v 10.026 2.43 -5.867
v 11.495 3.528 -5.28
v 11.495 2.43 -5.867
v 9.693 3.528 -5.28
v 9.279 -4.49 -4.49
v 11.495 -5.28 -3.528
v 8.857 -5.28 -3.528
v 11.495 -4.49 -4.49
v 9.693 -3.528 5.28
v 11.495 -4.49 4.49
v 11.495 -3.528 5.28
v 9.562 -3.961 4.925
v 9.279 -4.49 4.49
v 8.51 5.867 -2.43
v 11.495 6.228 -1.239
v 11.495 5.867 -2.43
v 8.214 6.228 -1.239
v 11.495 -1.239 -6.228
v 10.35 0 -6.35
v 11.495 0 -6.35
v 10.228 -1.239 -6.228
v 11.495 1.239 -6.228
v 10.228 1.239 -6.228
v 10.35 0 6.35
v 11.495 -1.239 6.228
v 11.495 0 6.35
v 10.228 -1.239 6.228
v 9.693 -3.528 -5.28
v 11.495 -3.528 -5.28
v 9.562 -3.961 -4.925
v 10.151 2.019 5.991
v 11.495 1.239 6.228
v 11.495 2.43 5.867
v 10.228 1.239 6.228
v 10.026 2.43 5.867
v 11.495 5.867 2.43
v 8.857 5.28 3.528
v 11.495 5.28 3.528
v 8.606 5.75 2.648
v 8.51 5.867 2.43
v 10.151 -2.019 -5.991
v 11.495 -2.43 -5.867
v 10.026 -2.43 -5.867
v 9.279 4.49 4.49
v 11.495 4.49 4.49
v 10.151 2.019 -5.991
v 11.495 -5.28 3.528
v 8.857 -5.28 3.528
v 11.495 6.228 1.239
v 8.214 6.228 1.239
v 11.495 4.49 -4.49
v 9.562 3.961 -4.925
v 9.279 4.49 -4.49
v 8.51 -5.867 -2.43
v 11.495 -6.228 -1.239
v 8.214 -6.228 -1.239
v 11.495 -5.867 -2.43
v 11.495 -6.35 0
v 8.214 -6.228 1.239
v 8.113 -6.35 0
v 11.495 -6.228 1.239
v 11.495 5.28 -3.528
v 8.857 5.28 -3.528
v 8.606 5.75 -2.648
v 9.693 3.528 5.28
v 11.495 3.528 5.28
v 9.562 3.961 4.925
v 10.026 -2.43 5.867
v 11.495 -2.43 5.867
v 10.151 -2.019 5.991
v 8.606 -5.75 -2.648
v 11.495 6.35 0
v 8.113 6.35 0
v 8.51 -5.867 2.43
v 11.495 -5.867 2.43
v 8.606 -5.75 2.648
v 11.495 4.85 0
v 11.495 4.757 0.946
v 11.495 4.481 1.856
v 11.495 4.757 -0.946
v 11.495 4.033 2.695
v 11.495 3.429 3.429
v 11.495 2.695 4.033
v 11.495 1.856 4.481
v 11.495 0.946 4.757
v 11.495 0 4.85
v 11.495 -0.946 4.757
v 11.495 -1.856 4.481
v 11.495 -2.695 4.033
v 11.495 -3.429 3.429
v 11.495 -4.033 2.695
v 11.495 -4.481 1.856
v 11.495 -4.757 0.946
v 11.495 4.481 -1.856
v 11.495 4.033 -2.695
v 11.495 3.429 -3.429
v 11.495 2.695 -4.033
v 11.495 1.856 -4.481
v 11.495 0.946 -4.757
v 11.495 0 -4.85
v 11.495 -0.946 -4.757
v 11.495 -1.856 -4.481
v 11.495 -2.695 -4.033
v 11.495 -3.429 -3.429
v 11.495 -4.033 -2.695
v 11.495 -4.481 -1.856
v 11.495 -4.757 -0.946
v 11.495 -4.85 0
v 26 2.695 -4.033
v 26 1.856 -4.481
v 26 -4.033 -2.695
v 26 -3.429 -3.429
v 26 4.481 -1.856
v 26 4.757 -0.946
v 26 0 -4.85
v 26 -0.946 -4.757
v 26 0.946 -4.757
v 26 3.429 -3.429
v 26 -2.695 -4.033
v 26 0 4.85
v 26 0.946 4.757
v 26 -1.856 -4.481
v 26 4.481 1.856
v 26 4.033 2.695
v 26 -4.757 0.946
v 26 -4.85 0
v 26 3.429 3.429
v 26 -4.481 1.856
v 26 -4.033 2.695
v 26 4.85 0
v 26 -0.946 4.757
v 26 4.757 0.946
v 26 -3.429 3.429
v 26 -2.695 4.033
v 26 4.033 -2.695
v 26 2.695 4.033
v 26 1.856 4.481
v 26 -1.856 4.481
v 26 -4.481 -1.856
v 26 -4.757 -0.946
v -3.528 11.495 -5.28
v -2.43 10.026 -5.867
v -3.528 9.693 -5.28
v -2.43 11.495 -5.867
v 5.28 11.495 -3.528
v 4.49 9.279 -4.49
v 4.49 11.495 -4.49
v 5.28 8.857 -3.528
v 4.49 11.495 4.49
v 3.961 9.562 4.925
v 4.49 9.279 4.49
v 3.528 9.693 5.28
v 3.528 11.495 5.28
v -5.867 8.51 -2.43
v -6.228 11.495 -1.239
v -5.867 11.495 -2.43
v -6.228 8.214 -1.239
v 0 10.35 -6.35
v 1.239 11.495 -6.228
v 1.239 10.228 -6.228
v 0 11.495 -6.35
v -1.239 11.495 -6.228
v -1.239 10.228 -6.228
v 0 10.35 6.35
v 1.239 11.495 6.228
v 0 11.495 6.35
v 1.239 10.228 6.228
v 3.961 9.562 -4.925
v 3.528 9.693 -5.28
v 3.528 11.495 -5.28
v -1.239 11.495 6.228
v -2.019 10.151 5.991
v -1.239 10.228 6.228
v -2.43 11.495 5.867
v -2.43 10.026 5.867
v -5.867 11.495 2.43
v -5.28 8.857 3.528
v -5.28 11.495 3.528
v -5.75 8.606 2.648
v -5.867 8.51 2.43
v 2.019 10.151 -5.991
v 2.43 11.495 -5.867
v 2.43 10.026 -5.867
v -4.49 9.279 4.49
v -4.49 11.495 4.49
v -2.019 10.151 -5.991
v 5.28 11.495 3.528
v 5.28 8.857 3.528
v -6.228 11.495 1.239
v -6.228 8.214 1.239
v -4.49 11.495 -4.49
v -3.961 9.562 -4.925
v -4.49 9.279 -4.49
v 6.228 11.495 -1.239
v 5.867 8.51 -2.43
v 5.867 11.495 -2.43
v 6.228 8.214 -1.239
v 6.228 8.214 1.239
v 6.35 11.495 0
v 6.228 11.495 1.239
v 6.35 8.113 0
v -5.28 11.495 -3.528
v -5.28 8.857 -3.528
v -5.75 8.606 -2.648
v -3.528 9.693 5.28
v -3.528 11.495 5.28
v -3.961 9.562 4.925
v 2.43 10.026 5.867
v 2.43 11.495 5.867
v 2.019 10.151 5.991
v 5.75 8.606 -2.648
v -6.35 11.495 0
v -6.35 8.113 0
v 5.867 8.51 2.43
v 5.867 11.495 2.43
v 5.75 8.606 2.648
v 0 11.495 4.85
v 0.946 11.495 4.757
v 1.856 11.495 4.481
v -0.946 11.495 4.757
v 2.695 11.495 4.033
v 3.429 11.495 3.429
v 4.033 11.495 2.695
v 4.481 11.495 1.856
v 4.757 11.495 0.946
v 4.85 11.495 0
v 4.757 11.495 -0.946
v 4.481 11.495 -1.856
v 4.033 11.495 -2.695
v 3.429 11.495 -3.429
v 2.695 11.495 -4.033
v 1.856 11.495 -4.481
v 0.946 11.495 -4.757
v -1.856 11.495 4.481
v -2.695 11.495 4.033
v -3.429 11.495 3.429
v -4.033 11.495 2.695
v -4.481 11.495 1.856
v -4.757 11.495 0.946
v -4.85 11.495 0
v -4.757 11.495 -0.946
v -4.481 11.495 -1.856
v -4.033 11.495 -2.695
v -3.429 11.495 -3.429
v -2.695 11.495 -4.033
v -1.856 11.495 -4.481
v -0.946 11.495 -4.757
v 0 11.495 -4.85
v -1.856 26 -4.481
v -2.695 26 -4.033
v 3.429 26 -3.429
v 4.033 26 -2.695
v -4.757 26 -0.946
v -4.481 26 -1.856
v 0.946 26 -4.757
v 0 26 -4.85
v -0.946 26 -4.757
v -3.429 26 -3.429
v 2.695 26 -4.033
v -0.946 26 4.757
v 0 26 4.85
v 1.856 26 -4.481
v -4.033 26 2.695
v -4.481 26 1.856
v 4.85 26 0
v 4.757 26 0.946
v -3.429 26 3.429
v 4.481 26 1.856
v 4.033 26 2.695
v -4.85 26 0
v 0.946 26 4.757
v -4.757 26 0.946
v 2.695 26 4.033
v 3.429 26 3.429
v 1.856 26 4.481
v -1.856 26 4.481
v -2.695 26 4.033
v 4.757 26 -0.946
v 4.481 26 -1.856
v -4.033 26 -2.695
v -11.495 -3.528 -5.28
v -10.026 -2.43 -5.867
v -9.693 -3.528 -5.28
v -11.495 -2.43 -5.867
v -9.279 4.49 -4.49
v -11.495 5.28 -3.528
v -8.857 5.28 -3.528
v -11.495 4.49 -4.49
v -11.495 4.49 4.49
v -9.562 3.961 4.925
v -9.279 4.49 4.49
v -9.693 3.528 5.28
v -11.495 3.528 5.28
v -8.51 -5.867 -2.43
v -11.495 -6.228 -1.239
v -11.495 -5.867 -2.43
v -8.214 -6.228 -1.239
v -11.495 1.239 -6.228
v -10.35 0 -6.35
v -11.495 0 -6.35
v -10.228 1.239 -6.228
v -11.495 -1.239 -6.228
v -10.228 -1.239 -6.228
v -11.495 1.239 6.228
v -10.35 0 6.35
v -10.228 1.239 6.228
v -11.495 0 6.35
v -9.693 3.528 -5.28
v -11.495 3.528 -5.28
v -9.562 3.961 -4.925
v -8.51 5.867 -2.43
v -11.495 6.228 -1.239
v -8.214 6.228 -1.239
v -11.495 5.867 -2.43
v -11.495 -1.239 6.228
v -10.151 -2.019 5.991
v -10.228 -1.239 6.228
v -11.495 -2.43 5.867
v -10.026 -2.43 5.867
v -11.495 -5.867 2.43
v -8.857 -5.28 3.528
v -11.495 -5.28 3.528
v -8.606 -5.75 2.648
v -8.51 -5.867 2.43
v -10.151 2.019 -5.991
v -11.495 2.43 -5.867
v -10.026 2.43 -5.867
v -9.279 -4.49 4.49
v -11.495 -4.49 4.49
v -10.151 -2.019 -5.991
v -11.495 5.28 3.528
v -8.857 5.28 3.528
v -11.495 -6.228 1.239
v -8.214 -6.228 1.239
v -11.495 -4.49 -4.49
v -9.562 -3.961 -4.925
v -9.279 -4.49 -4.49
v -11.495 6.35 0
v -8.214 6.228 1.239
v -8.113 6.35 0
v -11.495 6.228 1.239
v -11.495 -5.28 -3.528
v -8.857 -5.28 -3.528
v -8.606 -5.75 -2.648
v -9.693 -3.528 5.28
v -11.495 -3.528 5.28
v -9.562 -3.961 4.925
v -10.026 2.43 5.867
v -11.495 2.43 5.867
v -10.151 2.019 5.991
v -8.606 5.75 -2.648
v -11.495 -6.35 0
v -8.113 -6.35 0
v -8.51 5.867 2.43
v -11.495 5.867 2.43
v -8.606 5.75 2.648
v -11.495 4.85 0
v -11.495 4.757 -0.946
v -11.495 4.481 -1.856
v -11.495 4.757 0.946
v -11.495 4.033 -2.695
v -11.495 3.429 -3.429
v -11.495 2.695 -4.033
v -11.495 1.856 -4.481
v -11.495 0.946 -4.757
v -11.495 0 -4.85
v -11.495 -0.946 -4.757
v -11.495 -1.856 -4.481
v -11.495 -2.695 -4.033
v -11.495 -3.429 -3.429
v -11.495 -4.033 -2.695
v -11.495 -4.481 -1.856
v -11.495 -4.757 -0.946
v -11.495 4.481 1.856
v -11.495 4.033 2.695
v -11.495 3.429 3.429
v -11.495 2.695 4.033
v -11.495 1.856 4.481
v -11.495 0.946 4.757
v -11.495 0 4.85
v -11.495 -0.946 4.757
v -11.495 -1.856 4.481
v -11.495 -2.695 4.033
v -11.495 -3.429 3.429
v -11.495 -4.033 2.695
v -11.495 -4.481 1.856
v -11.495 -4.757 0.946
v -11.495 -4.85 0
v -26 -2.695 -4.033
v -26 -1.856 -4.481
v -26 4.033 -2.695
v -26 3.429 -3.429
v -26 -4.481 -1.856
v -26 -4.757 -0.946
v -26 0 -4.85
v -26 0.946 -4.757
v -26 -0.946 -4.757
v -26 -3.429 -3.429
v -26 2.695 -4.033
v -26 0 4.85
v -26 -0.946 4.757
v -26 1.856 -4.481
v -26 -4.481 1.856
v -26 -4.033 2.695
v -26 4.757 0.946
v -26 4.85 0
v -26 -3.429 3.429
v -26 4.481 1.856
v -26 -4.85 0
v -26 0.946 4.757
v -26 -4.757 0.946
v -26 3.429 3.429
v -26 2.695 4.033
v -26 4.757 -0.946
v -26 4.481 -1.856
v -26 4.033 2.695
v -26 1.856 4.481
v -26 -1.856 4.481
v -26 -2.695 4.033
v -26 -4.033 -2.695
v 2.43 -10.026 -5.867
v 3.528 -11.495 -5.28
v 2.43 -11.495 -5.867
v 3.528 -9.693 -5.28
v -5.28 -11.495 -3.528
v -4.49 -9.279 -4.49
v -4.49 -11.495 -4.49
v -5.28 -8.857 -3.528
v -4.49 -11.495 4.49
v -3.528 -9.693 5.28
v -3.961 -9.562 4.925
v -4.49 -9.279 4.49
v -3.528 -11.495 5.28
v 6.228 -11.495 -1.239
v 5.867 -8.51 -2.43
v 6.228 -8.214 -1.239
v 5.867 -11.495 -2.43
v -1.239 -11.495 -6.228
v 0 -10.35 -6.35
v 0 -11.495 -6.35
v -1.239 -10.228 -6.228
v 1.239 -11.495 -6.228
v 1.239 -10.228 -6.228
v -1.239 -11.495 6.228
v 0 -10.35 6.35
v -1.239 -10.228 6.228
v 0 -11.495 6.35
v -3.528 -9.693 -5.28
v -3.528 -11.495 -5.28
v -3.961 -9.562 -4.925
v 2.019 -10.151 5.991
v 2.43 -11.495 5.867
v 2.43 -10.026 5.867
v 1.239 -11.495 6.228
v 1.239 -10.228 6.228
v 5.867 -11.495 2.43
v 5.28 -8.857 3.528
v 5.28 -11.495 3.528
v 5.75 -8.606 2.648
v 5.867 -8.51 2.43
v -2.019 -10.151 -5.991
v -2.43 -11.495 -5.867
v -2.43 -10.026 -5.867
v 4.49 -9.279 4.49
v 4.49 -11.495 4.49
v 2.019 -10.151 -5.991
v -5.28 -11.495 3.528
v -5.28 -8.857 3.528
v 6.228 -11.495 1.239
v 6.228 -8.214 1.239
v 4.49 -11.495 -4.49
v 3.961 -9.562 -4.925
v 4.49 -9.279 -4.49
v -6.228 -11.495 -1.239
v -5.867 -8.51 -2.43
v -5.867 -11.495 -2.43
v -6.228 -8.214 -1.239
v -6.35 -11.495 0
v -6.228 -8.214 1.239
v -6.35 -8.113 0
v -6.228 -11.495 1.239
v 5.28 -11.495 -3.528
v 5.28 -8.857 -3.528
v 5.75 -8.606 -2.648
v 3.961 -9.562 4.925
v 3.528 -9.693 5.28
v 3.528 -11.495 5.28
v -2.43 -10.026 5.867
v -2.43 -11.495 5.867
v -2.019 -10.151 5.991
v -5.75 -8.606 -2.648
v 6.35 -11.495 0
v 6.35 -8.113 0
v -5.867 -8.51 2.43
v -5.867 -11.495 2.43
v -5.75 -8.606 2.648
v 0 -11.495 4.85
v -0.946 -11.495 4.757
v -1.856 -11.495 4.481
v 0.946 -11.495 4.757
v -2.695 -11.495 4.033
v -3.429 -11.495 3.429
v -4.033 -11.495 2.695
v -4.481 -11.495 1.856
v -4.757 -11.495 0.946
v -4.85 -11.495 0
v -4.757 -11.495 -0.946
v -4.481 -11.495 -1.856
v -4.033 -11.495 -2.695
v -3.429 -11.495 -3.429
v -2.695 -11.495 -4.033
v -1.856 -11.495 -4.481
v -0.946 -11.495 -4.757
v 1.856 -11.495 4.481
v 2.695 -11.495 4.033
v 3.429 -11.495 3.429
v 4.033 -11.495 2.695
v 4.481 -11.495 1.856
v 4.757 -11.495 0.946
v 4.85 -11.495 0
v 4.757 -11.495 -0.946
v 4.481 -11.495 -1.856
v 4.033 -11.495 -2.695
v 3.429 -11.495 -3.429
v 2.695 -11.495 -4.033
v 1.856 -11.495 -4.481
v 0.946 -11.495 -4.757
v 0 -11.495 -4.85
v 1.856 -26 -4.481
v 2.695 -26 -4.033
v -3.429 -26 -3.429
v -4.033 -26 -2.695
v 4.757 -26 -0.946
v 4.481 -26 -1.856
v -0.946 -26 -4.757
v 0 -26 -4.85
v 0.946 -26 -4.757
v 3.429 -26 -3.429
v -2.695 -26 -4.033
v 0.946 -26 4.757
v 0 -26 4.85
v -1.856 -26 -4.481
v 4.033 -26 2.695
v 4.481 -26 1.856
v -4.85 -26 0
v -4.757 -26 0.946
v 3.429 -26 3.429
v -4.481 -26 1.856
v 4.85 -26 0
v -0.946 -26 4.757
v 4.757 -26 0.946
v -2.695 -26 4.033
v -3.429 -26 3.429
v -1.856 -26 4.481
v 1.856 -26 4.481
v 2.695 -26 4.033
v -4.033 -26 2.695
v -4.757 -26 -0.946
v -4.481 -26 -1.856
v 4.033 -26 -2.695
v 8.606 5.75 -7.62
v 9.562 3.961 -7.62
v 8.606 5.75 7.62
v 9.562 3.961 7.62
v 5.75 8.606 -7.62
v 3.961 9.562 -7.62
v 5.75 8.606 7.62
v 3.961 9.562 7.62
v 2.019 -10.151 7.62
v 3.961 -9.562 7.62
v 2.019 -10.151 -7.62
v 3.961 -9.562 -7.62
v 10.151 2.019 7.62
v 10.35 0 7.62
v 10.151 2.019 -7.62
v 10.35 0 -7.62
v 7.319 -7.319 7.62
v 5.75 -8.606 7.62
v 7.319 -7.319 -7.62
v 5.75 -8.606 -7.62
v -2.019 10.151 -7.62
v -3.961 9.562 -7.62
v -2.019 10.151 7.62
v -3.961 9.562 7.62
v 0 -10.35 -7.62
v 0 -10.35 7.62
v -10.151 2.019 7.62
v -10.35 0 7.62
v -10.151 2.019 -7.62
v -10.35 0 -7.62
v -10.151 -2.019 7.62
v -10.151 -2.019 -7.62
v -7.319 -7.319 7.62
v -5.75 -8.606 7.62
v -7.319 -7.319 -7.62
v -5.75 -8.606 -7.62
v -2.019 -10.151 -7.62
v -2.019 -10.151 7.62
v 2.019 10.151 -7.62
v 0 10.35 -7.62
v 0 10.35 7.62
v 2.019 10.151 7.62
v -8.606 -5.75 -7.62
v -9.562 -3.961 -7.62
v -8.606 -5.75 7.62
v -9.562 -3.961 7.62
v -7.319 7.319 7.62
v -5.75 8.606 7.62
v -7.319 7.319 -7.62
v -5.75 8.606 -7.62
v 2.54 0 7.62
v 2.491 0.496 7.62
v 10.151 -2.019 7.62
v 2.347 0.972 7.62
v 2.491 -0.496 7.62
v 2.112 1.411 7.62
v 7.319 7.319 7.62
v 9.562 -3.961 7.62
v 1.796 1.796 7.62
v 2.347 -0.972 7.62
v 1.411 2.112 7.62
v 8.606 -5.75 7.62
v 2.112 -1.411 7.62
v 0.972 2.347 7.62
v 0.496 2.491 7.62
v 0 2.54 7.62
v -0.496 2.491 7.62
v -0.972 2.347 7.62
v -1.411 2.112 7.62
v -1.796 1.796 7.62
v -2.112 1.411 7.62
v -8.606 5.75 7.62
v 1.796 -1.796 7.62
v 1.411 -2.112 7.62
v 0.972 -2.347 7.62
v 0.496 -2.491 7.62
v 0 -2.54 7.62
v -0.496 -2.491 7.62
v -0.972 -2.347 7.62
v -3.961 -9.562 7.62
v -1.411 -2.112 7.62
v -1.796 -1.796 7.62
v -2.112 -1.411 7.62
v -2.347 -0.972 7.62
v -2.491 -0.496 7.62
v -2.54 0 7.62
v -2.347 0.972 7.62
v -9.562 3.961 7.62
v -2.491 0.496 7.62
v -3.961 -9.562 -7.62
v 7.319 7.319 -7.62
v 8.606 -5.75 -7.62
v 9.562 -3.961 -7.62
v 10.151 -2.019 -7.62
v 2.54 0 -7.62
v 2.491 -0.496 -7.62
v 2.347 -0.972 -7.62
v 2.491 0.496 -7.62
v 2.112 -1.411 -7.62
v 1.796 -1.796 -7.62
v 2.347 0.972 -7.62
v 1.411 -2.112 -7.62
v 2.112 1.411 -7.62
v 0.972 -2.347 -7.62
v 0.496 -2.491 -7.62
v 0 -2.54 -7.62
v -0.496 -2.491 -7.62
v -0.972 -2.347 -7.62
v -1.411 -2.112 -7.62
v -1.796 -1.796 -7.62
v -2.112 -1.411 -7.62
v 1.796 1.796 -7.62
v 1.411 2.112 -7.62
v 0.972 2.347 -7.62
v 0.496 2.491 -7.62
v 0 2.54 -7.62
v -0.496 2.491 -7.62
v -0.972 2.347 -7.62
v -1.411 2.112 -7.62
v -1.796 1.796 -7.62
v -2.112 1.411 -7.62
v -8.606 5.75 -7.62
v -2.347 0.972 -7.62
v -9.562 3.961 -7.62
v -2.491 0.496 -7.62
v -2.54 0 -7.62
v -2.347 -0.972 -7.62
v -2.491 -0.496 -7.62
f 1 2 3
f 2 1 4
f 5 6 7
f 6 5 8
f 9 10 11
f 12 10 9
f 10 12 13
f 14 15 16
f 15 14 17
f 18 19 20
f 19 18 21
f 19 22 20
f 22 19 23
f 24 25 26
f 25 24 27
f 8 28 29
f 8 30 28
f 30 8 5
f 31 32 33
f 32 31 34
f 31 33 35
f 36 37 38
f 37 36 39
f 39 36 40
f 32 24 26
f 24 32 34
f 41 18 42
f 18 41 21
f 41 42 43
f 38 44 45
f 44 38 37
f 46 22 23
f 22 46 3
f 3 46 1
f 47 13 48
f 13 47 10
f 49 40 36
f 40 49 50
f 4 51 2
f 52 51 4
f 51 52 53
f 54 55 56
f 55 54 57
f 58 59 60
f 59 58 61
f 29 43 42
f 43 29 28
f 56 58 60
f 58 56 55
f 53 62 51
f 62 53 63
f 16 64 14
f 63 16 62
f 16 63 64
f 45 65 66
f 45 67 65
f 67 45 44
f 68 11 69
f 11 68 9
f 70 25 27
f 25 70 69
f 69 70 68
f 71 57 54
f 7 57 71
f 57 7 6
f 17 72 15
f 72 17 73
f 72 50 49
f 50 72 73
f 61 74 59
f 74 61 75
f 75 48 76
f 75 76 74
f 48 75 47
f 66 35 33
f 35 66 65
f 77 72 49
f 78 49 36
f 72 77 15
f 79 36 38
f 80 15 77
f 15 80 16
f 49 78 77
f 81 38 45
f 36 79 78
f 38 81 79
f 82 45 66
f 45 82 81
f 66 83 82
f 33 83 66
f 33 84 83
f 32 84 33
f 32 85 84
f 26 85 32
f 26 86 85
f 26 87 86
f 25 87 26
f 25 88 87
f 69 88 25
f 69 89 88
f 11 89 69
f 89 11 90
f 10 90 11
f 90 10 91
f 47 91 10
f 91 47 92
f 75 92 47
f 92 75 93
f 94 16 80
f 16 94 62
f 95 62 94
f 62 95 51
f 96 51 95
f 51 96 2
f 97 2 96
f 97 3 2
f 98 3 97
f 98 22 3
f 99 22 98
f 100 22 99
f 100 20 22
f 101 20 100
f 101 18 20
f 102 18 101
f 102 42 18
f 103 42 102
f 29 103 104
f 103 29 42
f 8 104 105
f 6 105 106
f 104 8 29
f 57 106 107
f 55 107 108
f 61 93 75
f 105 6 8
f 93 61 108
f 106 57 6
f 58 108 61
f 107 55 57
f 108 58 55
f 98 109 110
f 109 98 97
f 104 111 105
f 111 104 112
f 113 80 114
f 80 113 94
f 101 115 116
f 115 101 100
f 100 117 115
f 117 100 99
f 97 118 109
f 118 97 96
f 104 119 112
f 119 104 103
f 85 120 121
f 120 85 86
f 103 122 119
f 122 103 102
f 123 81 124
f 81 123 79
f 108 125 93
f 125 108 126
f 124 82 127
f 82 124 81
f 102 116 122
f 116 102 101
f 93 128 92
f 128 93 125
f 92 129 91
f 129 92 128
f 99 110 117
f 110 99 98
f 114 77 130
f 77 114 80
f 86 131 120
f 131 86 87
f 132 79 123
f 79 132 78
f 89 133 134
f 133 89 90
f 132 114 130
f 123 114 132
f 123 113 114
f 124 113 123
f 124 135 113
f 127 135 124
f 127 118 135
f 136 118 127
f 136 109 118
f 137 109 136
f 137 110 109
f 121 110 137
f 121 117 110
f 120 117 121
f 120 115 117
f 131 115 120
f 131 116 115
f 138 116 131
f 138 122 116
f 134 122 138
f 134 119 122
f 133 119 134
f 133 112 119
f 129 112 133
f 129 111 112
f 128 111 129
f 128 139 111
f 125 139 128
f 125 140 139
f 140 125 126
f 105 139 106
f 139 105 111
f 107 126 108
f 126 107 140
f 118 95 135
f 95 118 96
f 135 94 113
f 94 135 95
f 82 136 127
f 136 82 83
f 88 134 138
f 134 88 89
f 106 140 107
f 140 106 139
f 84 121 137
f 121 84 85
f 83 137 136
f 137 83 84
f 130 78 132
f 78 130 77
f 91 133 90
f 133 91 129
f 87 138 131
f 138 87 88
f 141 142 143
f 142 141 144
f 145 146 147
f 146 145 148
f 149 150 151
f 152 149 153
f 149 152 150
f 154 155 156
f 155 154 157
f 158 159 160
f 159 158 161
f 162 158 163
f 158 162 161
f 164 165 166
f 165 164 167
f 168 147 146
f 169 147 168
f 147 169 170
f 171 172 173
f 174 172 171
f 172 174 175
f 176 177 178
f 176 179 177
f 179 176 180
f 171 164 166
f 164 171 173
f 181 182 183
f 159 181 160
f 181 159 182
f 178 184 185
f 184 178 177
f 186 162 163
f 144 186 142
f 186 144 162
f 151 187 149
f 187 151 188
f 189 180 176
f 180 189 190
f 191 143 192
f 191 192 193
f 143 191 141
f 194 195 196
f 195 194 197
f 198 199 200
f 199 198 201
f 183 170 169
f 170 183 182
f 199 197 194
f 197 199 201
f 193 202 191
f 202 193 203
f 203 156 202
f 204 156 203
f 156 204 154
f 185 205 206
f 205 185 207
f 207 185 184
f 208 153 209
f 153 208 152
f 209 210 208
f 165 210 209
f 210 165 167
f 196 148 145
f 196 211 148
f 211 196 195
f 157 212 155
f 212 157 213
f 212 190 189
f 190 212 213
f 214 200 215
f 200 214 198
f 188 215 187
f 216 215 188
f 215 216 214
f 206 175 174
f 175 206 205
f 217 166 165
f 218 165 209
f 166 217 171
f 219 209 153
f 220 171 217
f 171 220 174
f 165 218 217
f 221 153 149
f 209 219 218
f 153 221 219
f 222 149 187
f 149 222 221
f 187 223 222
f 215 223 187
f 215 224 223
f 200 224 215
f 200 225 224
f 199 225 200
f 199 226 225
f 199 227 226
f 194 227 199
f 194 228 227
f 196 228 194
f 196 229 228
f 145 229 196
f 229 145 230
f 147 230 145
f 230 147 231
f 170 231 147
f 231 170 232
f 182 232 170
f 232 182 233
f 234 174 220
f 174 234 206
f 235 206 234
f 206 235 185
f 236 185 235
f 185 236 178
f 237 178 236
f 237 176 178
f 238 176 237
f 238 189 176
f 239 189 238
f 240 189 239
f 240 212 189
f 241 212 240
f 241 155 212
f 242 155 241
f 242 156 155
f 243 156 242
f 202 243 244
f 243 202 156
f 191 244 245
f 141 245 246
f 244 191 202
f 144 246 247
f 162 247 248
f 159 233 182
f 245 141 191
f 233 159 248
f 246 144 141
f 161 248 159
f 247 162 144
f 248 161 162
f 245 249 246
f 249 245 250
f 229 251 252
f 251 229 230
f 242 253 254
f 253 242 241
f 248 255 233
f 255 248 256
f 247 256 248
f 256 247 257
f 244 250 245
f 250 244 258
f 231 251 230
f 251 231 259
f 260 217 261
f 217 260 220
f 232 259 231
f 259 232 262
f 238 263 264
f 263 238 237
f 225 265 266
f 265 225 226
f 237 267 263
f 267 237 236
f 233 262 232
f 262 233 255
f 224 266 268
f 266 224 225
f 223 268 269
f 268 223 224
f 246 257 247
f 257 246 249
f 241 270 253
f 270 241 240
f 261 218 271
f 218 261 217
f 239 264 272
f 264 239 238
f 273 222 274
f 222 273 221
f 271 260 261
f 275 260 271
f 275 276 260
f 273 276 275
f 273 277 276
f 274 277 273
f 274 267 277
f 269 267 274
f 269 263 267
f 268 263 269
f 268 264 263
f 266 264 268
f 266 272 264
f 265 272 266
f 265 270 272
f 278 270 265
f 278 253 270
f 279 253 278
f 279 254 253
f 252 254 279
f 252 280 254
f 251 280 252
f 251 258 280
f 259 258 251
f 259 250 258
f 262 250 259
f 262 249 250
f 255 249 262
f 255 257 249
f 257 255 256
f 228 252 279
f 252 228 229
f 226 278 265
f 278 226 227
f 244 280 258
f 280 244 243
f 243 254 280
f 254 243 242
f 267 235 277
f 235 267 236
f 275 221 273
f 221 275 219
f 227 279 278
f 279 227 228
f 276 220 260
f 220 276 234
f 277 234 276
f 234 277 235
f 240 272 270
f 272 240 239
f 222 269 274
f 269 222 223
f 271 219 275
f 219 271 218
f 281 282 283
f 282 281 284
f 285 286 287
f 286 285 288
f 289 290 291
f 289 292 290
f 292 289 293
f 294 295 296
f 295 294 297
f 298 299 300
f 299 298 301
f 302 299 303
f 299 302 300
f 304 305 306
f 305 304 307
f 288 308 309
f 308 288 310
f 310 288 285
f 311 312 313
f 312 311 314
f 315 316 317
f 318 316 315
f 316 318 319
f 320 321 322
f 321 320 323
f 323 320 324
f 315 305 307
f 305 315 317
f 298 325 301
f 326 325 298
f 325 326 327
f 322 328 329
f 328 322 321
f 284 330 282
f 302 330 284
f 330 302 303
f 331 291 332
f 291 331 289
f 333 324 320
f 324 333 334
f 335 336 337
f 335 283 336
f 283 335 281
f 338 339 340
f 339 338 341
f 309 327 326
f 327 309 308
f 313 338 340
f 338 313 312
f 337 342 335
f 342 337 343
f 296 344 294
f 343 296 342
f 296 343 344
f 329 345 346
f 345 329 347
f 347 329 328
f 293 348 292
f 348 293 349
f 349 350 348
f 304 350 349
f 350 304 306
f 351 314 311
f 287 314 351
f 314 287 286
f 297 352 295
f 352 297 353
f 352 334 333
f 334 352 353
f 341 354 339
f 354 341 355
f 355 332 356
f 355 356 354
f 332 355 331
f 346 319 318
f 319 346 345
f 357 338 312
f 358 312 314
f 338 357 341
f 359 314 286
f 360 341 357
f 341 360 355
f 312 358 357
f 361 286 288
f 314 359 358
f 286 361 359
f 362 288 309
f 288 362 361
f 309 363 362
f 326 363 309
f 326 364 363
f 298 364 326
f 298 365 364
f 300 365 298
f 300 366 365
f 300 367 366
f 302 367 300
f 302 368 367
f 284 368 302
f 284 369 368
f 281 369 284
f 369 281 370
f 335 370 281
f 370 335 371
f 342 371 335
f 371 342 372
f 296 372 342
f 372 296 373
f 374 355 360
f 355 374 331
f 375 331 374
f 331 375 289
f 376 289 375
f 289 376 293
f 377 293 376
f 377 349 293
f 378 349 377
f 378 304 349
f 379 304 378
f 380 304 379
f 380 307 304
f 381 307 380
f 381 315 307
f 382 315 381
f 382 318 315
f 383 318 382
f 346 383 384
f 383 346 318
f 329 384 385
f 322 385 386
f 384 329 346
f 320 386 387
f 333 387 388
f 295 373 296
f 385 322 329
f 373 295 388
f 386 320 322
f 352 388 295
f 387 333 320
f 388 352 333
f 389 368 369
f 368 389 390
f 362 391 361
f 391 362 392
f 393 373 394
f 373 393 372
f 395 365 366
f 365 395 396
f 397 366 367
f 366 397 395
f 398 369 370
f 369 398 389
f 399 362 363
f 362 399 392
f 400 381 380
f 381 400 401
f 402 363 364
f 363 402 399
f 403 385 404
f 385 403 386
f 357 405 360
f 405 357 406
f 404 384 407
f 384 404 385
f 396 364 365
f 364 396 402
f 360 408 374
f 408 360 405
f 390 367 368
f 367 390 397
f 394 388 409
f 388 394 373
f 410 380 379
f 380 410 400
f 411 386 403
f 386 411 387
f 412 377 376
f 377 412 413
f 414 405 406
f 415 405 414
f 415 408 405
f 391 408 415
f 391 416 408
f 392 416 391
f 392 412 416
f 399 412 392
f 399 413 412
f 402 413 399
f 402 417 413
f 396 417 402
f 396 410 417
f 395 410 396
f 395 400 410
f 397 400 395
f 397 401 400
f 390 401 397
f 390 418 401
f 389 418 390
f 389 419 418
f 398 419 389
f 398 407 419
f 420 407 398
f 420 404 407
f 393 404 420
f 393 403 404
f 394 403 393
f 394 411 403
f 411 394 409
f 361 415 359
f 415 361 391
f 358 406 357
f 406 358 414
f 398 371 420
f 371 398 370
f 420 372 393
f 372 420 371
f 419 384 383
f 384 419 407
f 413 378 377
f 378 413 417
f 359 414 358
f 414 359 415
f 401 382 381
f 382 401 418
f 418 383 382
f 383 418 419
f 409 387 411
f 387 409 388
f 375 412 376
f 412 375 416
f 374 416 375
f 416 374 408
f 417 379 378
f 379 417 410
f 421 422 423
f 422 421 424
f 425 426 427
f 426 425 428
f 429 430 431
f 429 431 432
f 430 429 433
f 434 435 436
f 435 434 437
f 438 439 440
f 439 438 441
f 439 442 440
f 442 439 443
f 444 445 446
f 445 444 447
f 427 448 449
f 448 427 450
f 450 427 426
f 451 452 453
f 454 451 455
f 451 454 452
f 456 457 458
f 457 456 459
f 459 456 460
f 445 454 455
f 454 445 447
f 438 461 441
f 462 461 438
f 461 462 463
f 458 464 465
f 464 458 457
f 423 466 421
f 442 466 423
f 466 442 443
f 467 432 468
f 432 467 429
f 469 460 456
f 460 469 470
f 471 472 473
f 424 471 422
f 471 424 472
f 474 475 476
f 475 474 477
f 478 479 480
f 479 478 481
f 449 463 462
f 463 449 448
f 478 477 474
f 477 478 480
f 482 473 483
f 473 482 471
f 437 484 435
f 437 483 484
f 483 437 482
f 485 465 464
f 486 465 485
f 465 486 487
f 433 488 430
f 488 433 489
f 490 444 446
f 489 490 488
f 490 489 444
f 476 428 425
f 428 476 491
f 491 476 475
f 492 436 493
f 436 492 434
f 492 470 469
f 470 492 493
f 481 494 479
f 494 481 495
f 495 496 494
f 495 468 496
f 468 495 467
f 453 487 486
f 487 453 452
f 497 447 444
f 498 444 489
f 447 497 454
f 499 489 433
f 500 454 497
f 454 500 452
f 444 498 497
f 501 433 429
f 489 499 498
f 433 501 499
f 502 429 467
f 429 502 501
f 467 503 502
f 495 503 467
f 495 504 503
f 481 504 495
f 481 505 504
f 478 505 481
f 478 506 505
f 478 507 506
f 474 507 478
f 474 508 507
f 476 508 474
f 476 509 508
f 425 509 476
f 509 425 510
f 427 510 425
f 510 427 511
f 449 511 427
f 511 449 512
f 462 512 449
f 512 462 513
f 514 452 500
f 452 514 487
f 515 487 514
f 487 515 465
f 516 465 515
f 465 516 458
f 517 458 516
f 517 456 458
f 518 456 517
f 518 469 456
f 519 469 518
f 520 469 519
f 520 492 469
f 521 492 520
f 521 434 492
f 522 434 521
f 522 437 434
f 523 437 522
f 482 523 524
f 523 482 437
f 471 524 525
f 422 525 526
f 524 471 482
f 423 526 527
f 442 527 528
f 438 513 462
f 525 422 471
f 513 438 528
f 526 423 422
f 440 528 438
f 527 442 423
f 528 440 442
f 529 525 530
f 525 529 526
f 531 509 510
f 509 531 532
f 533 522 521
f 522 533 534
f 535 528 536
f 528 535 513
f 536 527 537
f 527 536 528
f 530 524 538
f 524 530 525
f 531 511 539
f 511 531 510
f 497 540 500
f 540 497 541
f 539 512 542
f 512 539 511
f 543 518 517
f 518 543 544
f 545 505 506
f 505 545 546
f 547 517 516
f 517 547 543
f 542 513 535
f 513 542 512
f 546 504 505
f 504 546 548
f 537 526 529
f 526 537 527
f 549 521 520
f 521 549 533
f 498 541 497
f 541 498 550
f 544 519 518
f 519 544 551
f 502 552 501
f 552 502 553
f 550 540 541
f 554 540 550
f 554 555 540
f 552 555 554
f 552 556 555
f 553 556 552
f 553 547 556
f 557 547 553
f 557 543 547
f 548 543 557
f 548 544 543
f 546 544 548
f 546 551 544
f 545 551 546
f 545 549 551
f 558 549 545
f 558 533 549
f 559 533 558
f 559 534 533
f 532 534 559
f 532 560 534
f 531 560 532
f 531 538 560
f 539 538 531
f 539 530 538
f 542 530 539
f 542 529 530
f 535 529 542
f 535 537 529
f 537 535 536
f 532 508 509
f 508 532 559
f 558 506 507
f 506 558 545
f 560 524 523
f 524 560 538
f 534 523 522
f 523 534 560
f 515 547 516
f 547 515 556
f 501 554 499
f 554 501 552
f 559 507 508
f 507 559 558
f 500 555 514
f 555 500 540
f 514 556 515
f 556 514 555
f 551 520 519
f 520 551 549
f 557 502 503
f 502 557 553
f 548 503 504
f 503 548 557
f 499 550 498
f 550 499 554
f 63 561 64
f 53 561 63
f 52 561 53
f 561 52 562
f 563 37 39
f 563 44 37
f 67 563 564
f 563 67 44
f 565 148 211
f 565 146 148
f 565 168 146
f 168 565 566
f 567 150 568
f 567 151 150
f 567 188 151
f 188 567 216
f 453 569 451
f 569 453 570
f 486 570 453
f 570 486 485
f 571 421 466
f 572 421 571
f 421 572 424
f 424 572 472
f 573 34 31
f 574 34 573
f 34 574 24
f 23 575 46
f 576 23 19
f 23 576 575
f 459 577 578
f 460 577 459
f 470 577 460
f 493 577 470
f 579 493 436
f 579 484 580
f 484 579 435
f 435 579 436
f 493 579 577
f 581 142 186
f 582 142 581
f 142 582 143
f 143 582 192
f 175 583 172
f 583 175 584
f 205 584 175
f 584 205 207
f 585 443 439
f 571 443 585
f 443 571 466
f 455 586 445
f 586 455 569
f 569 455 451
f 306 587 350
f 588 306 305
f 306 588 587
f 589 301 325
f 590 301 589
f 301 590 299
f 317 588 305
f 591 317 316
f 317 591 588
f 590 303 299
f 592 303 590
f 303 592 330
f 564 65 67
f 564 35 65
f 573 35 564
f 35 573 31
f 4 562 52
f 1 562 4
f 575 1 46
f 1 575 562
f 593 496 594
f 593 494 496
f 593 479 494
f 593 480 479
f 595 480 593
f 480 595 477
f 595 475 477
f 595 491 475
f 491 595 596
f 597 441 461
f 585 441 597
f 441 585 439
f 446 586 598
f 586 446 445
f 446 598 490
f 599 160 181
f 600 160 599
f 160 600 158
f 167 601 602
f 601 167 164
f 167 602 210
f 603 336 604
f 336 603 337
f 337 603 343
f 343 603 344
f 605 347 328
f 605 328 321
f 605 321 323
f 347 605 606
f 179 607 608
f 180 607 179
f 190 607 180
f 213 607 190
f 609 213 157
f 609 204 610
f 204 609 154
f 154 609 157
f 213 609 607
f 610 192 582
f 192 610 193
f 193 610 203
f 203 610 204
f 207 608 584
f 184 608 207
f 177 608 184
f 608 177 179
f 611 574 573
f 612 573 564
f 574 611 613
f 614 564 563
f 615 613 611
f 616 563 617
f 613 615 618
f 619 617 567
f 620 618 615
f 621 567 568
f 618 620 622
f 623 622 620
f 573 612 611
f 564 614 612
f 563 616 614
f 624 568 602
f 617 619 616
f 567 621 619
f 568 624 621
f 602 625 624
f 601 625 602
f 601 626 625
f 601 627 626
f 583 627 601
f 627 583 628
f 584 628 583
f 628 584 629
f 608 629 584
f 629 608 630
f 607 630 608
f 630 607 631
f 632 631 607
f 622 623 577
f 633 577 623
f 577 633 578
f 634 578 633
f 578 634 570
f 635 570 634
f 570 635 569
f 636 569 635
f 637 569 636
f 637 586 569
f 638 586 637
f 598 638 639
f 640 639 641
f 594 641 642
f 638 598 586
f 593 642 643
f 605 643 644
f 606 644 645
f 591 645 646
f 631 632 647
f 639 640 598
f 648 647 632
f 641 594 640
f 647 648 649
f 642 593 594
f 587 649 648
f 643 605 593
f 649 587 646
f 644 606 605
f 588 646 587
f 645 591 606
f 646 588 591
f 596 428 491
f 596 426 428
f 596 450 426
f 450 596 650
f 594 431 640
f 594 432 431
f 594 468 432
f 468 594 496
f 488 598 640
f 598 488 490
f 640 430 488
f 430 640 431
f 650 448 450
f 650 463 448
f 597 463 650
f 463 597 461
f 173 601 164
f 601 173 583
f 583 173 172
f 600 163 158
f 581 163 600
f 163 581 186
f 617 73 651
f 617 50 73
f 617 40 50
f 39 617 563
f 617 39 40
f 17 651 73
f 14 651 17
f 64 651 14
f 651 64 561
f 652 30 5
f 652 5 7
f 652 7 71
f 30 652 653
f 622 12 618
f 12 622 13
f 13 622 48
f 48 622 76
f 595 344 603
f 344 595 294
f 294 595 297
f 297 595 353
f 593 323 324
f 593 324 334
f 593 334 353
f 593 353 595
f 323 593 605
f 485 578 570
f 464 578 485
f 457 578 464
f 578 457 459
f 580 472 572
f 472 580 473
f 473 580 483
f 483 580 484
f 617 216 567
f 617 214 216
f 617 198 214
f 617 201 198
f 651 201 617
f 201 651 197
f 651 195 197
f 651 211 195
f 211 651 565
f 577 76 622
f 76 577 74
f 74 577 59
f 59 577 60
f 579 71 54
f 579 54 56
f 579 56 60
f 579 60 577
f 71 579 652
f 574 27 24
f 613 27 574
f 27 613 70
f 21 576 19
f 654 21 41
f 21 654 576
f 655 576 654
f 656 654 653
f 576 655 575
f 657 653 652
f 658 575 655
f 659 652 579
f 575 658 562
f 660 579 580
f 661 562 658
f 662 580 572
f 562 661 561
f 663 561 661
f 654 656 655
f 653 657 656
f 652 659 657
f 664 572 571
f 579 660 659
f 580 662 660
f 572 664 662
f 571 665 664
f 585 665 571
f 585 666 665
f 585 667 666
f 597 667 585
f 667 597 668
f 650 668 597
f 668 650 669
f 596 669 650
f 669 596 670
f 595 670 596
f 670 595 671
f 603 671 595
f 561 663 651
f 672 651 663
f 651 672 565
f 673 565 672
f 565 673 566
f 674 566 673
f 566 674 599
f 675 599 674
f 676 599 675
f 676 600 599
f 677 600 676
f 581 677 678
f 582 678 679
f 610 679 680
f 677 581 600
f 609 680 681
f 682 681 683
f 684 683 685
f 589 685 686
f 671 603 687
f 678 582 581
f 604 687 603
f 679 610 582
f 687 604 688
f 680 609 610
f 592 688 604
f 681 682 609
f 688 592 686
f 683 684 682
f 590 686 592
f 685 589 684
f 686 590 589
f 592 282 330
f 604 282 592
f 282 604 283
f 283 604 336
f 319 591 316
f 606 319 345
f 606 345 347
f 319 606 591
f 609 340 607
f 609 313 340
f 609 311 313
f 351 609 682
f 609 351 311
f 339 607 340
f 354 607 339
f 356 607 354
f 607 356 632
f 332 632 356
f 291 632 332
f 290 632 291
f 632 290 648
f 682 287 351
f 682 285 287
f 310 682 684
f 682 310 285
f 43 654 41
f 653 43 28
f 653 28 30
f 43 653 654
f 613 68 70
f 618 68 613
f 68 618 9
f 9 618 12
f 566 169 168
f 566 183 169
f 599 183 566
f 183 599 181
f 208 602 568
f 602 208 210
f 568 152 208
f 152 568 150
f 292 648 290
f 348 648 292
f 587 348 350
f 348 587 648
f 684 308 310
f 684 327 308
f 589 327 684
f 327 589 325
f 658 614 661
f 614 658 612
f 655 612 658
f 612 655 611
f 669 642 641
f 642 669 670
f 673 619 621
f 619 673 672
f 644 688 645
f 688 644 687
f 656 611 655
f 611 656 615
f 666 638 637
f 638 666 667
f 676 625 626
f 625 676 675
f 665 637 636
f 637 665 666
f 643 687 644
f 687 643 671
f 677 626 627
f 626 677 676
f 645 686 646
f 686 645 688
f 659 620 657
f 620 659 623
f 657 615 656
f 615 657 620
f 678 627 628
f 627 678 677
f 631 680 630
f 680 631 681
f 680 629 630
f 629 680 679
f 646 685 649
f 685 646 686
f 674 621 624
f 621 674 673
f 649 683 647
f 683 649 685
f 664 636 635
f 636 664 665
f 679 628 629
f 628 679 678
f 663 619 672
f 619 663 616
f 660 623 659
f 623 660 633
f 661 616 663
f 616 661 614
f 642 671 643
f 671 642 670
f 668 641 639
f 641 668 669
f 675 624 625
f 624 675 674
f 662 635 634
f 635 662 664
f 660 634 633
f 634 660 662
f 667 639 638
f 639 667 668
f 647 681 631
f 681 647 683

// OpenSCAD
$fn = 32;

// ----------------------------------------------------------------------
// Cardan cross: 52 mm span, 12.7 mm trunnions
// ----------------------------------------------------------------------

// --- parameters (mm) ---
journal_d = 12.7;         // trunnion diameter
arm_len = 26;             // trunnion length from the centre
step_r = 4.32;            // step position from the centre
step_d = 9.7;             // journal diameter after the step
hub_d = 20.7;             // hub diameter
hub_h = 15.24;            // hub height
bore_d = 5.08;            // hub bore

difference() {
  union() {
    /* hub along the joint axis */
    cylinder(h = hub_h, d = hub_d, center = true);
    for (a = [0 : 90 : 270]) rotate([0, 0, a]) {
      /* trunnion, sunk into the hub */
      translate([hub_d / 4, 0, 0]) rotate([0, 90, 0]) cylinder(h = step_r + 2, d = journal_d);
      /* stepped journal out to the tip */
      translate([step_r - 0.5, 0, 0]) rotate([0, 90, 0]) cylinder(h = arm_len + 0.5 - step_r, d = step_d);
    }
  }
  /* lubrication bore through the hub, 2.5 mm clear on both sides */
  translate([0, 0, -hub_h / 2 - 2.5]) cylinder(h = hub_h + 5, d = bore_d);
}
